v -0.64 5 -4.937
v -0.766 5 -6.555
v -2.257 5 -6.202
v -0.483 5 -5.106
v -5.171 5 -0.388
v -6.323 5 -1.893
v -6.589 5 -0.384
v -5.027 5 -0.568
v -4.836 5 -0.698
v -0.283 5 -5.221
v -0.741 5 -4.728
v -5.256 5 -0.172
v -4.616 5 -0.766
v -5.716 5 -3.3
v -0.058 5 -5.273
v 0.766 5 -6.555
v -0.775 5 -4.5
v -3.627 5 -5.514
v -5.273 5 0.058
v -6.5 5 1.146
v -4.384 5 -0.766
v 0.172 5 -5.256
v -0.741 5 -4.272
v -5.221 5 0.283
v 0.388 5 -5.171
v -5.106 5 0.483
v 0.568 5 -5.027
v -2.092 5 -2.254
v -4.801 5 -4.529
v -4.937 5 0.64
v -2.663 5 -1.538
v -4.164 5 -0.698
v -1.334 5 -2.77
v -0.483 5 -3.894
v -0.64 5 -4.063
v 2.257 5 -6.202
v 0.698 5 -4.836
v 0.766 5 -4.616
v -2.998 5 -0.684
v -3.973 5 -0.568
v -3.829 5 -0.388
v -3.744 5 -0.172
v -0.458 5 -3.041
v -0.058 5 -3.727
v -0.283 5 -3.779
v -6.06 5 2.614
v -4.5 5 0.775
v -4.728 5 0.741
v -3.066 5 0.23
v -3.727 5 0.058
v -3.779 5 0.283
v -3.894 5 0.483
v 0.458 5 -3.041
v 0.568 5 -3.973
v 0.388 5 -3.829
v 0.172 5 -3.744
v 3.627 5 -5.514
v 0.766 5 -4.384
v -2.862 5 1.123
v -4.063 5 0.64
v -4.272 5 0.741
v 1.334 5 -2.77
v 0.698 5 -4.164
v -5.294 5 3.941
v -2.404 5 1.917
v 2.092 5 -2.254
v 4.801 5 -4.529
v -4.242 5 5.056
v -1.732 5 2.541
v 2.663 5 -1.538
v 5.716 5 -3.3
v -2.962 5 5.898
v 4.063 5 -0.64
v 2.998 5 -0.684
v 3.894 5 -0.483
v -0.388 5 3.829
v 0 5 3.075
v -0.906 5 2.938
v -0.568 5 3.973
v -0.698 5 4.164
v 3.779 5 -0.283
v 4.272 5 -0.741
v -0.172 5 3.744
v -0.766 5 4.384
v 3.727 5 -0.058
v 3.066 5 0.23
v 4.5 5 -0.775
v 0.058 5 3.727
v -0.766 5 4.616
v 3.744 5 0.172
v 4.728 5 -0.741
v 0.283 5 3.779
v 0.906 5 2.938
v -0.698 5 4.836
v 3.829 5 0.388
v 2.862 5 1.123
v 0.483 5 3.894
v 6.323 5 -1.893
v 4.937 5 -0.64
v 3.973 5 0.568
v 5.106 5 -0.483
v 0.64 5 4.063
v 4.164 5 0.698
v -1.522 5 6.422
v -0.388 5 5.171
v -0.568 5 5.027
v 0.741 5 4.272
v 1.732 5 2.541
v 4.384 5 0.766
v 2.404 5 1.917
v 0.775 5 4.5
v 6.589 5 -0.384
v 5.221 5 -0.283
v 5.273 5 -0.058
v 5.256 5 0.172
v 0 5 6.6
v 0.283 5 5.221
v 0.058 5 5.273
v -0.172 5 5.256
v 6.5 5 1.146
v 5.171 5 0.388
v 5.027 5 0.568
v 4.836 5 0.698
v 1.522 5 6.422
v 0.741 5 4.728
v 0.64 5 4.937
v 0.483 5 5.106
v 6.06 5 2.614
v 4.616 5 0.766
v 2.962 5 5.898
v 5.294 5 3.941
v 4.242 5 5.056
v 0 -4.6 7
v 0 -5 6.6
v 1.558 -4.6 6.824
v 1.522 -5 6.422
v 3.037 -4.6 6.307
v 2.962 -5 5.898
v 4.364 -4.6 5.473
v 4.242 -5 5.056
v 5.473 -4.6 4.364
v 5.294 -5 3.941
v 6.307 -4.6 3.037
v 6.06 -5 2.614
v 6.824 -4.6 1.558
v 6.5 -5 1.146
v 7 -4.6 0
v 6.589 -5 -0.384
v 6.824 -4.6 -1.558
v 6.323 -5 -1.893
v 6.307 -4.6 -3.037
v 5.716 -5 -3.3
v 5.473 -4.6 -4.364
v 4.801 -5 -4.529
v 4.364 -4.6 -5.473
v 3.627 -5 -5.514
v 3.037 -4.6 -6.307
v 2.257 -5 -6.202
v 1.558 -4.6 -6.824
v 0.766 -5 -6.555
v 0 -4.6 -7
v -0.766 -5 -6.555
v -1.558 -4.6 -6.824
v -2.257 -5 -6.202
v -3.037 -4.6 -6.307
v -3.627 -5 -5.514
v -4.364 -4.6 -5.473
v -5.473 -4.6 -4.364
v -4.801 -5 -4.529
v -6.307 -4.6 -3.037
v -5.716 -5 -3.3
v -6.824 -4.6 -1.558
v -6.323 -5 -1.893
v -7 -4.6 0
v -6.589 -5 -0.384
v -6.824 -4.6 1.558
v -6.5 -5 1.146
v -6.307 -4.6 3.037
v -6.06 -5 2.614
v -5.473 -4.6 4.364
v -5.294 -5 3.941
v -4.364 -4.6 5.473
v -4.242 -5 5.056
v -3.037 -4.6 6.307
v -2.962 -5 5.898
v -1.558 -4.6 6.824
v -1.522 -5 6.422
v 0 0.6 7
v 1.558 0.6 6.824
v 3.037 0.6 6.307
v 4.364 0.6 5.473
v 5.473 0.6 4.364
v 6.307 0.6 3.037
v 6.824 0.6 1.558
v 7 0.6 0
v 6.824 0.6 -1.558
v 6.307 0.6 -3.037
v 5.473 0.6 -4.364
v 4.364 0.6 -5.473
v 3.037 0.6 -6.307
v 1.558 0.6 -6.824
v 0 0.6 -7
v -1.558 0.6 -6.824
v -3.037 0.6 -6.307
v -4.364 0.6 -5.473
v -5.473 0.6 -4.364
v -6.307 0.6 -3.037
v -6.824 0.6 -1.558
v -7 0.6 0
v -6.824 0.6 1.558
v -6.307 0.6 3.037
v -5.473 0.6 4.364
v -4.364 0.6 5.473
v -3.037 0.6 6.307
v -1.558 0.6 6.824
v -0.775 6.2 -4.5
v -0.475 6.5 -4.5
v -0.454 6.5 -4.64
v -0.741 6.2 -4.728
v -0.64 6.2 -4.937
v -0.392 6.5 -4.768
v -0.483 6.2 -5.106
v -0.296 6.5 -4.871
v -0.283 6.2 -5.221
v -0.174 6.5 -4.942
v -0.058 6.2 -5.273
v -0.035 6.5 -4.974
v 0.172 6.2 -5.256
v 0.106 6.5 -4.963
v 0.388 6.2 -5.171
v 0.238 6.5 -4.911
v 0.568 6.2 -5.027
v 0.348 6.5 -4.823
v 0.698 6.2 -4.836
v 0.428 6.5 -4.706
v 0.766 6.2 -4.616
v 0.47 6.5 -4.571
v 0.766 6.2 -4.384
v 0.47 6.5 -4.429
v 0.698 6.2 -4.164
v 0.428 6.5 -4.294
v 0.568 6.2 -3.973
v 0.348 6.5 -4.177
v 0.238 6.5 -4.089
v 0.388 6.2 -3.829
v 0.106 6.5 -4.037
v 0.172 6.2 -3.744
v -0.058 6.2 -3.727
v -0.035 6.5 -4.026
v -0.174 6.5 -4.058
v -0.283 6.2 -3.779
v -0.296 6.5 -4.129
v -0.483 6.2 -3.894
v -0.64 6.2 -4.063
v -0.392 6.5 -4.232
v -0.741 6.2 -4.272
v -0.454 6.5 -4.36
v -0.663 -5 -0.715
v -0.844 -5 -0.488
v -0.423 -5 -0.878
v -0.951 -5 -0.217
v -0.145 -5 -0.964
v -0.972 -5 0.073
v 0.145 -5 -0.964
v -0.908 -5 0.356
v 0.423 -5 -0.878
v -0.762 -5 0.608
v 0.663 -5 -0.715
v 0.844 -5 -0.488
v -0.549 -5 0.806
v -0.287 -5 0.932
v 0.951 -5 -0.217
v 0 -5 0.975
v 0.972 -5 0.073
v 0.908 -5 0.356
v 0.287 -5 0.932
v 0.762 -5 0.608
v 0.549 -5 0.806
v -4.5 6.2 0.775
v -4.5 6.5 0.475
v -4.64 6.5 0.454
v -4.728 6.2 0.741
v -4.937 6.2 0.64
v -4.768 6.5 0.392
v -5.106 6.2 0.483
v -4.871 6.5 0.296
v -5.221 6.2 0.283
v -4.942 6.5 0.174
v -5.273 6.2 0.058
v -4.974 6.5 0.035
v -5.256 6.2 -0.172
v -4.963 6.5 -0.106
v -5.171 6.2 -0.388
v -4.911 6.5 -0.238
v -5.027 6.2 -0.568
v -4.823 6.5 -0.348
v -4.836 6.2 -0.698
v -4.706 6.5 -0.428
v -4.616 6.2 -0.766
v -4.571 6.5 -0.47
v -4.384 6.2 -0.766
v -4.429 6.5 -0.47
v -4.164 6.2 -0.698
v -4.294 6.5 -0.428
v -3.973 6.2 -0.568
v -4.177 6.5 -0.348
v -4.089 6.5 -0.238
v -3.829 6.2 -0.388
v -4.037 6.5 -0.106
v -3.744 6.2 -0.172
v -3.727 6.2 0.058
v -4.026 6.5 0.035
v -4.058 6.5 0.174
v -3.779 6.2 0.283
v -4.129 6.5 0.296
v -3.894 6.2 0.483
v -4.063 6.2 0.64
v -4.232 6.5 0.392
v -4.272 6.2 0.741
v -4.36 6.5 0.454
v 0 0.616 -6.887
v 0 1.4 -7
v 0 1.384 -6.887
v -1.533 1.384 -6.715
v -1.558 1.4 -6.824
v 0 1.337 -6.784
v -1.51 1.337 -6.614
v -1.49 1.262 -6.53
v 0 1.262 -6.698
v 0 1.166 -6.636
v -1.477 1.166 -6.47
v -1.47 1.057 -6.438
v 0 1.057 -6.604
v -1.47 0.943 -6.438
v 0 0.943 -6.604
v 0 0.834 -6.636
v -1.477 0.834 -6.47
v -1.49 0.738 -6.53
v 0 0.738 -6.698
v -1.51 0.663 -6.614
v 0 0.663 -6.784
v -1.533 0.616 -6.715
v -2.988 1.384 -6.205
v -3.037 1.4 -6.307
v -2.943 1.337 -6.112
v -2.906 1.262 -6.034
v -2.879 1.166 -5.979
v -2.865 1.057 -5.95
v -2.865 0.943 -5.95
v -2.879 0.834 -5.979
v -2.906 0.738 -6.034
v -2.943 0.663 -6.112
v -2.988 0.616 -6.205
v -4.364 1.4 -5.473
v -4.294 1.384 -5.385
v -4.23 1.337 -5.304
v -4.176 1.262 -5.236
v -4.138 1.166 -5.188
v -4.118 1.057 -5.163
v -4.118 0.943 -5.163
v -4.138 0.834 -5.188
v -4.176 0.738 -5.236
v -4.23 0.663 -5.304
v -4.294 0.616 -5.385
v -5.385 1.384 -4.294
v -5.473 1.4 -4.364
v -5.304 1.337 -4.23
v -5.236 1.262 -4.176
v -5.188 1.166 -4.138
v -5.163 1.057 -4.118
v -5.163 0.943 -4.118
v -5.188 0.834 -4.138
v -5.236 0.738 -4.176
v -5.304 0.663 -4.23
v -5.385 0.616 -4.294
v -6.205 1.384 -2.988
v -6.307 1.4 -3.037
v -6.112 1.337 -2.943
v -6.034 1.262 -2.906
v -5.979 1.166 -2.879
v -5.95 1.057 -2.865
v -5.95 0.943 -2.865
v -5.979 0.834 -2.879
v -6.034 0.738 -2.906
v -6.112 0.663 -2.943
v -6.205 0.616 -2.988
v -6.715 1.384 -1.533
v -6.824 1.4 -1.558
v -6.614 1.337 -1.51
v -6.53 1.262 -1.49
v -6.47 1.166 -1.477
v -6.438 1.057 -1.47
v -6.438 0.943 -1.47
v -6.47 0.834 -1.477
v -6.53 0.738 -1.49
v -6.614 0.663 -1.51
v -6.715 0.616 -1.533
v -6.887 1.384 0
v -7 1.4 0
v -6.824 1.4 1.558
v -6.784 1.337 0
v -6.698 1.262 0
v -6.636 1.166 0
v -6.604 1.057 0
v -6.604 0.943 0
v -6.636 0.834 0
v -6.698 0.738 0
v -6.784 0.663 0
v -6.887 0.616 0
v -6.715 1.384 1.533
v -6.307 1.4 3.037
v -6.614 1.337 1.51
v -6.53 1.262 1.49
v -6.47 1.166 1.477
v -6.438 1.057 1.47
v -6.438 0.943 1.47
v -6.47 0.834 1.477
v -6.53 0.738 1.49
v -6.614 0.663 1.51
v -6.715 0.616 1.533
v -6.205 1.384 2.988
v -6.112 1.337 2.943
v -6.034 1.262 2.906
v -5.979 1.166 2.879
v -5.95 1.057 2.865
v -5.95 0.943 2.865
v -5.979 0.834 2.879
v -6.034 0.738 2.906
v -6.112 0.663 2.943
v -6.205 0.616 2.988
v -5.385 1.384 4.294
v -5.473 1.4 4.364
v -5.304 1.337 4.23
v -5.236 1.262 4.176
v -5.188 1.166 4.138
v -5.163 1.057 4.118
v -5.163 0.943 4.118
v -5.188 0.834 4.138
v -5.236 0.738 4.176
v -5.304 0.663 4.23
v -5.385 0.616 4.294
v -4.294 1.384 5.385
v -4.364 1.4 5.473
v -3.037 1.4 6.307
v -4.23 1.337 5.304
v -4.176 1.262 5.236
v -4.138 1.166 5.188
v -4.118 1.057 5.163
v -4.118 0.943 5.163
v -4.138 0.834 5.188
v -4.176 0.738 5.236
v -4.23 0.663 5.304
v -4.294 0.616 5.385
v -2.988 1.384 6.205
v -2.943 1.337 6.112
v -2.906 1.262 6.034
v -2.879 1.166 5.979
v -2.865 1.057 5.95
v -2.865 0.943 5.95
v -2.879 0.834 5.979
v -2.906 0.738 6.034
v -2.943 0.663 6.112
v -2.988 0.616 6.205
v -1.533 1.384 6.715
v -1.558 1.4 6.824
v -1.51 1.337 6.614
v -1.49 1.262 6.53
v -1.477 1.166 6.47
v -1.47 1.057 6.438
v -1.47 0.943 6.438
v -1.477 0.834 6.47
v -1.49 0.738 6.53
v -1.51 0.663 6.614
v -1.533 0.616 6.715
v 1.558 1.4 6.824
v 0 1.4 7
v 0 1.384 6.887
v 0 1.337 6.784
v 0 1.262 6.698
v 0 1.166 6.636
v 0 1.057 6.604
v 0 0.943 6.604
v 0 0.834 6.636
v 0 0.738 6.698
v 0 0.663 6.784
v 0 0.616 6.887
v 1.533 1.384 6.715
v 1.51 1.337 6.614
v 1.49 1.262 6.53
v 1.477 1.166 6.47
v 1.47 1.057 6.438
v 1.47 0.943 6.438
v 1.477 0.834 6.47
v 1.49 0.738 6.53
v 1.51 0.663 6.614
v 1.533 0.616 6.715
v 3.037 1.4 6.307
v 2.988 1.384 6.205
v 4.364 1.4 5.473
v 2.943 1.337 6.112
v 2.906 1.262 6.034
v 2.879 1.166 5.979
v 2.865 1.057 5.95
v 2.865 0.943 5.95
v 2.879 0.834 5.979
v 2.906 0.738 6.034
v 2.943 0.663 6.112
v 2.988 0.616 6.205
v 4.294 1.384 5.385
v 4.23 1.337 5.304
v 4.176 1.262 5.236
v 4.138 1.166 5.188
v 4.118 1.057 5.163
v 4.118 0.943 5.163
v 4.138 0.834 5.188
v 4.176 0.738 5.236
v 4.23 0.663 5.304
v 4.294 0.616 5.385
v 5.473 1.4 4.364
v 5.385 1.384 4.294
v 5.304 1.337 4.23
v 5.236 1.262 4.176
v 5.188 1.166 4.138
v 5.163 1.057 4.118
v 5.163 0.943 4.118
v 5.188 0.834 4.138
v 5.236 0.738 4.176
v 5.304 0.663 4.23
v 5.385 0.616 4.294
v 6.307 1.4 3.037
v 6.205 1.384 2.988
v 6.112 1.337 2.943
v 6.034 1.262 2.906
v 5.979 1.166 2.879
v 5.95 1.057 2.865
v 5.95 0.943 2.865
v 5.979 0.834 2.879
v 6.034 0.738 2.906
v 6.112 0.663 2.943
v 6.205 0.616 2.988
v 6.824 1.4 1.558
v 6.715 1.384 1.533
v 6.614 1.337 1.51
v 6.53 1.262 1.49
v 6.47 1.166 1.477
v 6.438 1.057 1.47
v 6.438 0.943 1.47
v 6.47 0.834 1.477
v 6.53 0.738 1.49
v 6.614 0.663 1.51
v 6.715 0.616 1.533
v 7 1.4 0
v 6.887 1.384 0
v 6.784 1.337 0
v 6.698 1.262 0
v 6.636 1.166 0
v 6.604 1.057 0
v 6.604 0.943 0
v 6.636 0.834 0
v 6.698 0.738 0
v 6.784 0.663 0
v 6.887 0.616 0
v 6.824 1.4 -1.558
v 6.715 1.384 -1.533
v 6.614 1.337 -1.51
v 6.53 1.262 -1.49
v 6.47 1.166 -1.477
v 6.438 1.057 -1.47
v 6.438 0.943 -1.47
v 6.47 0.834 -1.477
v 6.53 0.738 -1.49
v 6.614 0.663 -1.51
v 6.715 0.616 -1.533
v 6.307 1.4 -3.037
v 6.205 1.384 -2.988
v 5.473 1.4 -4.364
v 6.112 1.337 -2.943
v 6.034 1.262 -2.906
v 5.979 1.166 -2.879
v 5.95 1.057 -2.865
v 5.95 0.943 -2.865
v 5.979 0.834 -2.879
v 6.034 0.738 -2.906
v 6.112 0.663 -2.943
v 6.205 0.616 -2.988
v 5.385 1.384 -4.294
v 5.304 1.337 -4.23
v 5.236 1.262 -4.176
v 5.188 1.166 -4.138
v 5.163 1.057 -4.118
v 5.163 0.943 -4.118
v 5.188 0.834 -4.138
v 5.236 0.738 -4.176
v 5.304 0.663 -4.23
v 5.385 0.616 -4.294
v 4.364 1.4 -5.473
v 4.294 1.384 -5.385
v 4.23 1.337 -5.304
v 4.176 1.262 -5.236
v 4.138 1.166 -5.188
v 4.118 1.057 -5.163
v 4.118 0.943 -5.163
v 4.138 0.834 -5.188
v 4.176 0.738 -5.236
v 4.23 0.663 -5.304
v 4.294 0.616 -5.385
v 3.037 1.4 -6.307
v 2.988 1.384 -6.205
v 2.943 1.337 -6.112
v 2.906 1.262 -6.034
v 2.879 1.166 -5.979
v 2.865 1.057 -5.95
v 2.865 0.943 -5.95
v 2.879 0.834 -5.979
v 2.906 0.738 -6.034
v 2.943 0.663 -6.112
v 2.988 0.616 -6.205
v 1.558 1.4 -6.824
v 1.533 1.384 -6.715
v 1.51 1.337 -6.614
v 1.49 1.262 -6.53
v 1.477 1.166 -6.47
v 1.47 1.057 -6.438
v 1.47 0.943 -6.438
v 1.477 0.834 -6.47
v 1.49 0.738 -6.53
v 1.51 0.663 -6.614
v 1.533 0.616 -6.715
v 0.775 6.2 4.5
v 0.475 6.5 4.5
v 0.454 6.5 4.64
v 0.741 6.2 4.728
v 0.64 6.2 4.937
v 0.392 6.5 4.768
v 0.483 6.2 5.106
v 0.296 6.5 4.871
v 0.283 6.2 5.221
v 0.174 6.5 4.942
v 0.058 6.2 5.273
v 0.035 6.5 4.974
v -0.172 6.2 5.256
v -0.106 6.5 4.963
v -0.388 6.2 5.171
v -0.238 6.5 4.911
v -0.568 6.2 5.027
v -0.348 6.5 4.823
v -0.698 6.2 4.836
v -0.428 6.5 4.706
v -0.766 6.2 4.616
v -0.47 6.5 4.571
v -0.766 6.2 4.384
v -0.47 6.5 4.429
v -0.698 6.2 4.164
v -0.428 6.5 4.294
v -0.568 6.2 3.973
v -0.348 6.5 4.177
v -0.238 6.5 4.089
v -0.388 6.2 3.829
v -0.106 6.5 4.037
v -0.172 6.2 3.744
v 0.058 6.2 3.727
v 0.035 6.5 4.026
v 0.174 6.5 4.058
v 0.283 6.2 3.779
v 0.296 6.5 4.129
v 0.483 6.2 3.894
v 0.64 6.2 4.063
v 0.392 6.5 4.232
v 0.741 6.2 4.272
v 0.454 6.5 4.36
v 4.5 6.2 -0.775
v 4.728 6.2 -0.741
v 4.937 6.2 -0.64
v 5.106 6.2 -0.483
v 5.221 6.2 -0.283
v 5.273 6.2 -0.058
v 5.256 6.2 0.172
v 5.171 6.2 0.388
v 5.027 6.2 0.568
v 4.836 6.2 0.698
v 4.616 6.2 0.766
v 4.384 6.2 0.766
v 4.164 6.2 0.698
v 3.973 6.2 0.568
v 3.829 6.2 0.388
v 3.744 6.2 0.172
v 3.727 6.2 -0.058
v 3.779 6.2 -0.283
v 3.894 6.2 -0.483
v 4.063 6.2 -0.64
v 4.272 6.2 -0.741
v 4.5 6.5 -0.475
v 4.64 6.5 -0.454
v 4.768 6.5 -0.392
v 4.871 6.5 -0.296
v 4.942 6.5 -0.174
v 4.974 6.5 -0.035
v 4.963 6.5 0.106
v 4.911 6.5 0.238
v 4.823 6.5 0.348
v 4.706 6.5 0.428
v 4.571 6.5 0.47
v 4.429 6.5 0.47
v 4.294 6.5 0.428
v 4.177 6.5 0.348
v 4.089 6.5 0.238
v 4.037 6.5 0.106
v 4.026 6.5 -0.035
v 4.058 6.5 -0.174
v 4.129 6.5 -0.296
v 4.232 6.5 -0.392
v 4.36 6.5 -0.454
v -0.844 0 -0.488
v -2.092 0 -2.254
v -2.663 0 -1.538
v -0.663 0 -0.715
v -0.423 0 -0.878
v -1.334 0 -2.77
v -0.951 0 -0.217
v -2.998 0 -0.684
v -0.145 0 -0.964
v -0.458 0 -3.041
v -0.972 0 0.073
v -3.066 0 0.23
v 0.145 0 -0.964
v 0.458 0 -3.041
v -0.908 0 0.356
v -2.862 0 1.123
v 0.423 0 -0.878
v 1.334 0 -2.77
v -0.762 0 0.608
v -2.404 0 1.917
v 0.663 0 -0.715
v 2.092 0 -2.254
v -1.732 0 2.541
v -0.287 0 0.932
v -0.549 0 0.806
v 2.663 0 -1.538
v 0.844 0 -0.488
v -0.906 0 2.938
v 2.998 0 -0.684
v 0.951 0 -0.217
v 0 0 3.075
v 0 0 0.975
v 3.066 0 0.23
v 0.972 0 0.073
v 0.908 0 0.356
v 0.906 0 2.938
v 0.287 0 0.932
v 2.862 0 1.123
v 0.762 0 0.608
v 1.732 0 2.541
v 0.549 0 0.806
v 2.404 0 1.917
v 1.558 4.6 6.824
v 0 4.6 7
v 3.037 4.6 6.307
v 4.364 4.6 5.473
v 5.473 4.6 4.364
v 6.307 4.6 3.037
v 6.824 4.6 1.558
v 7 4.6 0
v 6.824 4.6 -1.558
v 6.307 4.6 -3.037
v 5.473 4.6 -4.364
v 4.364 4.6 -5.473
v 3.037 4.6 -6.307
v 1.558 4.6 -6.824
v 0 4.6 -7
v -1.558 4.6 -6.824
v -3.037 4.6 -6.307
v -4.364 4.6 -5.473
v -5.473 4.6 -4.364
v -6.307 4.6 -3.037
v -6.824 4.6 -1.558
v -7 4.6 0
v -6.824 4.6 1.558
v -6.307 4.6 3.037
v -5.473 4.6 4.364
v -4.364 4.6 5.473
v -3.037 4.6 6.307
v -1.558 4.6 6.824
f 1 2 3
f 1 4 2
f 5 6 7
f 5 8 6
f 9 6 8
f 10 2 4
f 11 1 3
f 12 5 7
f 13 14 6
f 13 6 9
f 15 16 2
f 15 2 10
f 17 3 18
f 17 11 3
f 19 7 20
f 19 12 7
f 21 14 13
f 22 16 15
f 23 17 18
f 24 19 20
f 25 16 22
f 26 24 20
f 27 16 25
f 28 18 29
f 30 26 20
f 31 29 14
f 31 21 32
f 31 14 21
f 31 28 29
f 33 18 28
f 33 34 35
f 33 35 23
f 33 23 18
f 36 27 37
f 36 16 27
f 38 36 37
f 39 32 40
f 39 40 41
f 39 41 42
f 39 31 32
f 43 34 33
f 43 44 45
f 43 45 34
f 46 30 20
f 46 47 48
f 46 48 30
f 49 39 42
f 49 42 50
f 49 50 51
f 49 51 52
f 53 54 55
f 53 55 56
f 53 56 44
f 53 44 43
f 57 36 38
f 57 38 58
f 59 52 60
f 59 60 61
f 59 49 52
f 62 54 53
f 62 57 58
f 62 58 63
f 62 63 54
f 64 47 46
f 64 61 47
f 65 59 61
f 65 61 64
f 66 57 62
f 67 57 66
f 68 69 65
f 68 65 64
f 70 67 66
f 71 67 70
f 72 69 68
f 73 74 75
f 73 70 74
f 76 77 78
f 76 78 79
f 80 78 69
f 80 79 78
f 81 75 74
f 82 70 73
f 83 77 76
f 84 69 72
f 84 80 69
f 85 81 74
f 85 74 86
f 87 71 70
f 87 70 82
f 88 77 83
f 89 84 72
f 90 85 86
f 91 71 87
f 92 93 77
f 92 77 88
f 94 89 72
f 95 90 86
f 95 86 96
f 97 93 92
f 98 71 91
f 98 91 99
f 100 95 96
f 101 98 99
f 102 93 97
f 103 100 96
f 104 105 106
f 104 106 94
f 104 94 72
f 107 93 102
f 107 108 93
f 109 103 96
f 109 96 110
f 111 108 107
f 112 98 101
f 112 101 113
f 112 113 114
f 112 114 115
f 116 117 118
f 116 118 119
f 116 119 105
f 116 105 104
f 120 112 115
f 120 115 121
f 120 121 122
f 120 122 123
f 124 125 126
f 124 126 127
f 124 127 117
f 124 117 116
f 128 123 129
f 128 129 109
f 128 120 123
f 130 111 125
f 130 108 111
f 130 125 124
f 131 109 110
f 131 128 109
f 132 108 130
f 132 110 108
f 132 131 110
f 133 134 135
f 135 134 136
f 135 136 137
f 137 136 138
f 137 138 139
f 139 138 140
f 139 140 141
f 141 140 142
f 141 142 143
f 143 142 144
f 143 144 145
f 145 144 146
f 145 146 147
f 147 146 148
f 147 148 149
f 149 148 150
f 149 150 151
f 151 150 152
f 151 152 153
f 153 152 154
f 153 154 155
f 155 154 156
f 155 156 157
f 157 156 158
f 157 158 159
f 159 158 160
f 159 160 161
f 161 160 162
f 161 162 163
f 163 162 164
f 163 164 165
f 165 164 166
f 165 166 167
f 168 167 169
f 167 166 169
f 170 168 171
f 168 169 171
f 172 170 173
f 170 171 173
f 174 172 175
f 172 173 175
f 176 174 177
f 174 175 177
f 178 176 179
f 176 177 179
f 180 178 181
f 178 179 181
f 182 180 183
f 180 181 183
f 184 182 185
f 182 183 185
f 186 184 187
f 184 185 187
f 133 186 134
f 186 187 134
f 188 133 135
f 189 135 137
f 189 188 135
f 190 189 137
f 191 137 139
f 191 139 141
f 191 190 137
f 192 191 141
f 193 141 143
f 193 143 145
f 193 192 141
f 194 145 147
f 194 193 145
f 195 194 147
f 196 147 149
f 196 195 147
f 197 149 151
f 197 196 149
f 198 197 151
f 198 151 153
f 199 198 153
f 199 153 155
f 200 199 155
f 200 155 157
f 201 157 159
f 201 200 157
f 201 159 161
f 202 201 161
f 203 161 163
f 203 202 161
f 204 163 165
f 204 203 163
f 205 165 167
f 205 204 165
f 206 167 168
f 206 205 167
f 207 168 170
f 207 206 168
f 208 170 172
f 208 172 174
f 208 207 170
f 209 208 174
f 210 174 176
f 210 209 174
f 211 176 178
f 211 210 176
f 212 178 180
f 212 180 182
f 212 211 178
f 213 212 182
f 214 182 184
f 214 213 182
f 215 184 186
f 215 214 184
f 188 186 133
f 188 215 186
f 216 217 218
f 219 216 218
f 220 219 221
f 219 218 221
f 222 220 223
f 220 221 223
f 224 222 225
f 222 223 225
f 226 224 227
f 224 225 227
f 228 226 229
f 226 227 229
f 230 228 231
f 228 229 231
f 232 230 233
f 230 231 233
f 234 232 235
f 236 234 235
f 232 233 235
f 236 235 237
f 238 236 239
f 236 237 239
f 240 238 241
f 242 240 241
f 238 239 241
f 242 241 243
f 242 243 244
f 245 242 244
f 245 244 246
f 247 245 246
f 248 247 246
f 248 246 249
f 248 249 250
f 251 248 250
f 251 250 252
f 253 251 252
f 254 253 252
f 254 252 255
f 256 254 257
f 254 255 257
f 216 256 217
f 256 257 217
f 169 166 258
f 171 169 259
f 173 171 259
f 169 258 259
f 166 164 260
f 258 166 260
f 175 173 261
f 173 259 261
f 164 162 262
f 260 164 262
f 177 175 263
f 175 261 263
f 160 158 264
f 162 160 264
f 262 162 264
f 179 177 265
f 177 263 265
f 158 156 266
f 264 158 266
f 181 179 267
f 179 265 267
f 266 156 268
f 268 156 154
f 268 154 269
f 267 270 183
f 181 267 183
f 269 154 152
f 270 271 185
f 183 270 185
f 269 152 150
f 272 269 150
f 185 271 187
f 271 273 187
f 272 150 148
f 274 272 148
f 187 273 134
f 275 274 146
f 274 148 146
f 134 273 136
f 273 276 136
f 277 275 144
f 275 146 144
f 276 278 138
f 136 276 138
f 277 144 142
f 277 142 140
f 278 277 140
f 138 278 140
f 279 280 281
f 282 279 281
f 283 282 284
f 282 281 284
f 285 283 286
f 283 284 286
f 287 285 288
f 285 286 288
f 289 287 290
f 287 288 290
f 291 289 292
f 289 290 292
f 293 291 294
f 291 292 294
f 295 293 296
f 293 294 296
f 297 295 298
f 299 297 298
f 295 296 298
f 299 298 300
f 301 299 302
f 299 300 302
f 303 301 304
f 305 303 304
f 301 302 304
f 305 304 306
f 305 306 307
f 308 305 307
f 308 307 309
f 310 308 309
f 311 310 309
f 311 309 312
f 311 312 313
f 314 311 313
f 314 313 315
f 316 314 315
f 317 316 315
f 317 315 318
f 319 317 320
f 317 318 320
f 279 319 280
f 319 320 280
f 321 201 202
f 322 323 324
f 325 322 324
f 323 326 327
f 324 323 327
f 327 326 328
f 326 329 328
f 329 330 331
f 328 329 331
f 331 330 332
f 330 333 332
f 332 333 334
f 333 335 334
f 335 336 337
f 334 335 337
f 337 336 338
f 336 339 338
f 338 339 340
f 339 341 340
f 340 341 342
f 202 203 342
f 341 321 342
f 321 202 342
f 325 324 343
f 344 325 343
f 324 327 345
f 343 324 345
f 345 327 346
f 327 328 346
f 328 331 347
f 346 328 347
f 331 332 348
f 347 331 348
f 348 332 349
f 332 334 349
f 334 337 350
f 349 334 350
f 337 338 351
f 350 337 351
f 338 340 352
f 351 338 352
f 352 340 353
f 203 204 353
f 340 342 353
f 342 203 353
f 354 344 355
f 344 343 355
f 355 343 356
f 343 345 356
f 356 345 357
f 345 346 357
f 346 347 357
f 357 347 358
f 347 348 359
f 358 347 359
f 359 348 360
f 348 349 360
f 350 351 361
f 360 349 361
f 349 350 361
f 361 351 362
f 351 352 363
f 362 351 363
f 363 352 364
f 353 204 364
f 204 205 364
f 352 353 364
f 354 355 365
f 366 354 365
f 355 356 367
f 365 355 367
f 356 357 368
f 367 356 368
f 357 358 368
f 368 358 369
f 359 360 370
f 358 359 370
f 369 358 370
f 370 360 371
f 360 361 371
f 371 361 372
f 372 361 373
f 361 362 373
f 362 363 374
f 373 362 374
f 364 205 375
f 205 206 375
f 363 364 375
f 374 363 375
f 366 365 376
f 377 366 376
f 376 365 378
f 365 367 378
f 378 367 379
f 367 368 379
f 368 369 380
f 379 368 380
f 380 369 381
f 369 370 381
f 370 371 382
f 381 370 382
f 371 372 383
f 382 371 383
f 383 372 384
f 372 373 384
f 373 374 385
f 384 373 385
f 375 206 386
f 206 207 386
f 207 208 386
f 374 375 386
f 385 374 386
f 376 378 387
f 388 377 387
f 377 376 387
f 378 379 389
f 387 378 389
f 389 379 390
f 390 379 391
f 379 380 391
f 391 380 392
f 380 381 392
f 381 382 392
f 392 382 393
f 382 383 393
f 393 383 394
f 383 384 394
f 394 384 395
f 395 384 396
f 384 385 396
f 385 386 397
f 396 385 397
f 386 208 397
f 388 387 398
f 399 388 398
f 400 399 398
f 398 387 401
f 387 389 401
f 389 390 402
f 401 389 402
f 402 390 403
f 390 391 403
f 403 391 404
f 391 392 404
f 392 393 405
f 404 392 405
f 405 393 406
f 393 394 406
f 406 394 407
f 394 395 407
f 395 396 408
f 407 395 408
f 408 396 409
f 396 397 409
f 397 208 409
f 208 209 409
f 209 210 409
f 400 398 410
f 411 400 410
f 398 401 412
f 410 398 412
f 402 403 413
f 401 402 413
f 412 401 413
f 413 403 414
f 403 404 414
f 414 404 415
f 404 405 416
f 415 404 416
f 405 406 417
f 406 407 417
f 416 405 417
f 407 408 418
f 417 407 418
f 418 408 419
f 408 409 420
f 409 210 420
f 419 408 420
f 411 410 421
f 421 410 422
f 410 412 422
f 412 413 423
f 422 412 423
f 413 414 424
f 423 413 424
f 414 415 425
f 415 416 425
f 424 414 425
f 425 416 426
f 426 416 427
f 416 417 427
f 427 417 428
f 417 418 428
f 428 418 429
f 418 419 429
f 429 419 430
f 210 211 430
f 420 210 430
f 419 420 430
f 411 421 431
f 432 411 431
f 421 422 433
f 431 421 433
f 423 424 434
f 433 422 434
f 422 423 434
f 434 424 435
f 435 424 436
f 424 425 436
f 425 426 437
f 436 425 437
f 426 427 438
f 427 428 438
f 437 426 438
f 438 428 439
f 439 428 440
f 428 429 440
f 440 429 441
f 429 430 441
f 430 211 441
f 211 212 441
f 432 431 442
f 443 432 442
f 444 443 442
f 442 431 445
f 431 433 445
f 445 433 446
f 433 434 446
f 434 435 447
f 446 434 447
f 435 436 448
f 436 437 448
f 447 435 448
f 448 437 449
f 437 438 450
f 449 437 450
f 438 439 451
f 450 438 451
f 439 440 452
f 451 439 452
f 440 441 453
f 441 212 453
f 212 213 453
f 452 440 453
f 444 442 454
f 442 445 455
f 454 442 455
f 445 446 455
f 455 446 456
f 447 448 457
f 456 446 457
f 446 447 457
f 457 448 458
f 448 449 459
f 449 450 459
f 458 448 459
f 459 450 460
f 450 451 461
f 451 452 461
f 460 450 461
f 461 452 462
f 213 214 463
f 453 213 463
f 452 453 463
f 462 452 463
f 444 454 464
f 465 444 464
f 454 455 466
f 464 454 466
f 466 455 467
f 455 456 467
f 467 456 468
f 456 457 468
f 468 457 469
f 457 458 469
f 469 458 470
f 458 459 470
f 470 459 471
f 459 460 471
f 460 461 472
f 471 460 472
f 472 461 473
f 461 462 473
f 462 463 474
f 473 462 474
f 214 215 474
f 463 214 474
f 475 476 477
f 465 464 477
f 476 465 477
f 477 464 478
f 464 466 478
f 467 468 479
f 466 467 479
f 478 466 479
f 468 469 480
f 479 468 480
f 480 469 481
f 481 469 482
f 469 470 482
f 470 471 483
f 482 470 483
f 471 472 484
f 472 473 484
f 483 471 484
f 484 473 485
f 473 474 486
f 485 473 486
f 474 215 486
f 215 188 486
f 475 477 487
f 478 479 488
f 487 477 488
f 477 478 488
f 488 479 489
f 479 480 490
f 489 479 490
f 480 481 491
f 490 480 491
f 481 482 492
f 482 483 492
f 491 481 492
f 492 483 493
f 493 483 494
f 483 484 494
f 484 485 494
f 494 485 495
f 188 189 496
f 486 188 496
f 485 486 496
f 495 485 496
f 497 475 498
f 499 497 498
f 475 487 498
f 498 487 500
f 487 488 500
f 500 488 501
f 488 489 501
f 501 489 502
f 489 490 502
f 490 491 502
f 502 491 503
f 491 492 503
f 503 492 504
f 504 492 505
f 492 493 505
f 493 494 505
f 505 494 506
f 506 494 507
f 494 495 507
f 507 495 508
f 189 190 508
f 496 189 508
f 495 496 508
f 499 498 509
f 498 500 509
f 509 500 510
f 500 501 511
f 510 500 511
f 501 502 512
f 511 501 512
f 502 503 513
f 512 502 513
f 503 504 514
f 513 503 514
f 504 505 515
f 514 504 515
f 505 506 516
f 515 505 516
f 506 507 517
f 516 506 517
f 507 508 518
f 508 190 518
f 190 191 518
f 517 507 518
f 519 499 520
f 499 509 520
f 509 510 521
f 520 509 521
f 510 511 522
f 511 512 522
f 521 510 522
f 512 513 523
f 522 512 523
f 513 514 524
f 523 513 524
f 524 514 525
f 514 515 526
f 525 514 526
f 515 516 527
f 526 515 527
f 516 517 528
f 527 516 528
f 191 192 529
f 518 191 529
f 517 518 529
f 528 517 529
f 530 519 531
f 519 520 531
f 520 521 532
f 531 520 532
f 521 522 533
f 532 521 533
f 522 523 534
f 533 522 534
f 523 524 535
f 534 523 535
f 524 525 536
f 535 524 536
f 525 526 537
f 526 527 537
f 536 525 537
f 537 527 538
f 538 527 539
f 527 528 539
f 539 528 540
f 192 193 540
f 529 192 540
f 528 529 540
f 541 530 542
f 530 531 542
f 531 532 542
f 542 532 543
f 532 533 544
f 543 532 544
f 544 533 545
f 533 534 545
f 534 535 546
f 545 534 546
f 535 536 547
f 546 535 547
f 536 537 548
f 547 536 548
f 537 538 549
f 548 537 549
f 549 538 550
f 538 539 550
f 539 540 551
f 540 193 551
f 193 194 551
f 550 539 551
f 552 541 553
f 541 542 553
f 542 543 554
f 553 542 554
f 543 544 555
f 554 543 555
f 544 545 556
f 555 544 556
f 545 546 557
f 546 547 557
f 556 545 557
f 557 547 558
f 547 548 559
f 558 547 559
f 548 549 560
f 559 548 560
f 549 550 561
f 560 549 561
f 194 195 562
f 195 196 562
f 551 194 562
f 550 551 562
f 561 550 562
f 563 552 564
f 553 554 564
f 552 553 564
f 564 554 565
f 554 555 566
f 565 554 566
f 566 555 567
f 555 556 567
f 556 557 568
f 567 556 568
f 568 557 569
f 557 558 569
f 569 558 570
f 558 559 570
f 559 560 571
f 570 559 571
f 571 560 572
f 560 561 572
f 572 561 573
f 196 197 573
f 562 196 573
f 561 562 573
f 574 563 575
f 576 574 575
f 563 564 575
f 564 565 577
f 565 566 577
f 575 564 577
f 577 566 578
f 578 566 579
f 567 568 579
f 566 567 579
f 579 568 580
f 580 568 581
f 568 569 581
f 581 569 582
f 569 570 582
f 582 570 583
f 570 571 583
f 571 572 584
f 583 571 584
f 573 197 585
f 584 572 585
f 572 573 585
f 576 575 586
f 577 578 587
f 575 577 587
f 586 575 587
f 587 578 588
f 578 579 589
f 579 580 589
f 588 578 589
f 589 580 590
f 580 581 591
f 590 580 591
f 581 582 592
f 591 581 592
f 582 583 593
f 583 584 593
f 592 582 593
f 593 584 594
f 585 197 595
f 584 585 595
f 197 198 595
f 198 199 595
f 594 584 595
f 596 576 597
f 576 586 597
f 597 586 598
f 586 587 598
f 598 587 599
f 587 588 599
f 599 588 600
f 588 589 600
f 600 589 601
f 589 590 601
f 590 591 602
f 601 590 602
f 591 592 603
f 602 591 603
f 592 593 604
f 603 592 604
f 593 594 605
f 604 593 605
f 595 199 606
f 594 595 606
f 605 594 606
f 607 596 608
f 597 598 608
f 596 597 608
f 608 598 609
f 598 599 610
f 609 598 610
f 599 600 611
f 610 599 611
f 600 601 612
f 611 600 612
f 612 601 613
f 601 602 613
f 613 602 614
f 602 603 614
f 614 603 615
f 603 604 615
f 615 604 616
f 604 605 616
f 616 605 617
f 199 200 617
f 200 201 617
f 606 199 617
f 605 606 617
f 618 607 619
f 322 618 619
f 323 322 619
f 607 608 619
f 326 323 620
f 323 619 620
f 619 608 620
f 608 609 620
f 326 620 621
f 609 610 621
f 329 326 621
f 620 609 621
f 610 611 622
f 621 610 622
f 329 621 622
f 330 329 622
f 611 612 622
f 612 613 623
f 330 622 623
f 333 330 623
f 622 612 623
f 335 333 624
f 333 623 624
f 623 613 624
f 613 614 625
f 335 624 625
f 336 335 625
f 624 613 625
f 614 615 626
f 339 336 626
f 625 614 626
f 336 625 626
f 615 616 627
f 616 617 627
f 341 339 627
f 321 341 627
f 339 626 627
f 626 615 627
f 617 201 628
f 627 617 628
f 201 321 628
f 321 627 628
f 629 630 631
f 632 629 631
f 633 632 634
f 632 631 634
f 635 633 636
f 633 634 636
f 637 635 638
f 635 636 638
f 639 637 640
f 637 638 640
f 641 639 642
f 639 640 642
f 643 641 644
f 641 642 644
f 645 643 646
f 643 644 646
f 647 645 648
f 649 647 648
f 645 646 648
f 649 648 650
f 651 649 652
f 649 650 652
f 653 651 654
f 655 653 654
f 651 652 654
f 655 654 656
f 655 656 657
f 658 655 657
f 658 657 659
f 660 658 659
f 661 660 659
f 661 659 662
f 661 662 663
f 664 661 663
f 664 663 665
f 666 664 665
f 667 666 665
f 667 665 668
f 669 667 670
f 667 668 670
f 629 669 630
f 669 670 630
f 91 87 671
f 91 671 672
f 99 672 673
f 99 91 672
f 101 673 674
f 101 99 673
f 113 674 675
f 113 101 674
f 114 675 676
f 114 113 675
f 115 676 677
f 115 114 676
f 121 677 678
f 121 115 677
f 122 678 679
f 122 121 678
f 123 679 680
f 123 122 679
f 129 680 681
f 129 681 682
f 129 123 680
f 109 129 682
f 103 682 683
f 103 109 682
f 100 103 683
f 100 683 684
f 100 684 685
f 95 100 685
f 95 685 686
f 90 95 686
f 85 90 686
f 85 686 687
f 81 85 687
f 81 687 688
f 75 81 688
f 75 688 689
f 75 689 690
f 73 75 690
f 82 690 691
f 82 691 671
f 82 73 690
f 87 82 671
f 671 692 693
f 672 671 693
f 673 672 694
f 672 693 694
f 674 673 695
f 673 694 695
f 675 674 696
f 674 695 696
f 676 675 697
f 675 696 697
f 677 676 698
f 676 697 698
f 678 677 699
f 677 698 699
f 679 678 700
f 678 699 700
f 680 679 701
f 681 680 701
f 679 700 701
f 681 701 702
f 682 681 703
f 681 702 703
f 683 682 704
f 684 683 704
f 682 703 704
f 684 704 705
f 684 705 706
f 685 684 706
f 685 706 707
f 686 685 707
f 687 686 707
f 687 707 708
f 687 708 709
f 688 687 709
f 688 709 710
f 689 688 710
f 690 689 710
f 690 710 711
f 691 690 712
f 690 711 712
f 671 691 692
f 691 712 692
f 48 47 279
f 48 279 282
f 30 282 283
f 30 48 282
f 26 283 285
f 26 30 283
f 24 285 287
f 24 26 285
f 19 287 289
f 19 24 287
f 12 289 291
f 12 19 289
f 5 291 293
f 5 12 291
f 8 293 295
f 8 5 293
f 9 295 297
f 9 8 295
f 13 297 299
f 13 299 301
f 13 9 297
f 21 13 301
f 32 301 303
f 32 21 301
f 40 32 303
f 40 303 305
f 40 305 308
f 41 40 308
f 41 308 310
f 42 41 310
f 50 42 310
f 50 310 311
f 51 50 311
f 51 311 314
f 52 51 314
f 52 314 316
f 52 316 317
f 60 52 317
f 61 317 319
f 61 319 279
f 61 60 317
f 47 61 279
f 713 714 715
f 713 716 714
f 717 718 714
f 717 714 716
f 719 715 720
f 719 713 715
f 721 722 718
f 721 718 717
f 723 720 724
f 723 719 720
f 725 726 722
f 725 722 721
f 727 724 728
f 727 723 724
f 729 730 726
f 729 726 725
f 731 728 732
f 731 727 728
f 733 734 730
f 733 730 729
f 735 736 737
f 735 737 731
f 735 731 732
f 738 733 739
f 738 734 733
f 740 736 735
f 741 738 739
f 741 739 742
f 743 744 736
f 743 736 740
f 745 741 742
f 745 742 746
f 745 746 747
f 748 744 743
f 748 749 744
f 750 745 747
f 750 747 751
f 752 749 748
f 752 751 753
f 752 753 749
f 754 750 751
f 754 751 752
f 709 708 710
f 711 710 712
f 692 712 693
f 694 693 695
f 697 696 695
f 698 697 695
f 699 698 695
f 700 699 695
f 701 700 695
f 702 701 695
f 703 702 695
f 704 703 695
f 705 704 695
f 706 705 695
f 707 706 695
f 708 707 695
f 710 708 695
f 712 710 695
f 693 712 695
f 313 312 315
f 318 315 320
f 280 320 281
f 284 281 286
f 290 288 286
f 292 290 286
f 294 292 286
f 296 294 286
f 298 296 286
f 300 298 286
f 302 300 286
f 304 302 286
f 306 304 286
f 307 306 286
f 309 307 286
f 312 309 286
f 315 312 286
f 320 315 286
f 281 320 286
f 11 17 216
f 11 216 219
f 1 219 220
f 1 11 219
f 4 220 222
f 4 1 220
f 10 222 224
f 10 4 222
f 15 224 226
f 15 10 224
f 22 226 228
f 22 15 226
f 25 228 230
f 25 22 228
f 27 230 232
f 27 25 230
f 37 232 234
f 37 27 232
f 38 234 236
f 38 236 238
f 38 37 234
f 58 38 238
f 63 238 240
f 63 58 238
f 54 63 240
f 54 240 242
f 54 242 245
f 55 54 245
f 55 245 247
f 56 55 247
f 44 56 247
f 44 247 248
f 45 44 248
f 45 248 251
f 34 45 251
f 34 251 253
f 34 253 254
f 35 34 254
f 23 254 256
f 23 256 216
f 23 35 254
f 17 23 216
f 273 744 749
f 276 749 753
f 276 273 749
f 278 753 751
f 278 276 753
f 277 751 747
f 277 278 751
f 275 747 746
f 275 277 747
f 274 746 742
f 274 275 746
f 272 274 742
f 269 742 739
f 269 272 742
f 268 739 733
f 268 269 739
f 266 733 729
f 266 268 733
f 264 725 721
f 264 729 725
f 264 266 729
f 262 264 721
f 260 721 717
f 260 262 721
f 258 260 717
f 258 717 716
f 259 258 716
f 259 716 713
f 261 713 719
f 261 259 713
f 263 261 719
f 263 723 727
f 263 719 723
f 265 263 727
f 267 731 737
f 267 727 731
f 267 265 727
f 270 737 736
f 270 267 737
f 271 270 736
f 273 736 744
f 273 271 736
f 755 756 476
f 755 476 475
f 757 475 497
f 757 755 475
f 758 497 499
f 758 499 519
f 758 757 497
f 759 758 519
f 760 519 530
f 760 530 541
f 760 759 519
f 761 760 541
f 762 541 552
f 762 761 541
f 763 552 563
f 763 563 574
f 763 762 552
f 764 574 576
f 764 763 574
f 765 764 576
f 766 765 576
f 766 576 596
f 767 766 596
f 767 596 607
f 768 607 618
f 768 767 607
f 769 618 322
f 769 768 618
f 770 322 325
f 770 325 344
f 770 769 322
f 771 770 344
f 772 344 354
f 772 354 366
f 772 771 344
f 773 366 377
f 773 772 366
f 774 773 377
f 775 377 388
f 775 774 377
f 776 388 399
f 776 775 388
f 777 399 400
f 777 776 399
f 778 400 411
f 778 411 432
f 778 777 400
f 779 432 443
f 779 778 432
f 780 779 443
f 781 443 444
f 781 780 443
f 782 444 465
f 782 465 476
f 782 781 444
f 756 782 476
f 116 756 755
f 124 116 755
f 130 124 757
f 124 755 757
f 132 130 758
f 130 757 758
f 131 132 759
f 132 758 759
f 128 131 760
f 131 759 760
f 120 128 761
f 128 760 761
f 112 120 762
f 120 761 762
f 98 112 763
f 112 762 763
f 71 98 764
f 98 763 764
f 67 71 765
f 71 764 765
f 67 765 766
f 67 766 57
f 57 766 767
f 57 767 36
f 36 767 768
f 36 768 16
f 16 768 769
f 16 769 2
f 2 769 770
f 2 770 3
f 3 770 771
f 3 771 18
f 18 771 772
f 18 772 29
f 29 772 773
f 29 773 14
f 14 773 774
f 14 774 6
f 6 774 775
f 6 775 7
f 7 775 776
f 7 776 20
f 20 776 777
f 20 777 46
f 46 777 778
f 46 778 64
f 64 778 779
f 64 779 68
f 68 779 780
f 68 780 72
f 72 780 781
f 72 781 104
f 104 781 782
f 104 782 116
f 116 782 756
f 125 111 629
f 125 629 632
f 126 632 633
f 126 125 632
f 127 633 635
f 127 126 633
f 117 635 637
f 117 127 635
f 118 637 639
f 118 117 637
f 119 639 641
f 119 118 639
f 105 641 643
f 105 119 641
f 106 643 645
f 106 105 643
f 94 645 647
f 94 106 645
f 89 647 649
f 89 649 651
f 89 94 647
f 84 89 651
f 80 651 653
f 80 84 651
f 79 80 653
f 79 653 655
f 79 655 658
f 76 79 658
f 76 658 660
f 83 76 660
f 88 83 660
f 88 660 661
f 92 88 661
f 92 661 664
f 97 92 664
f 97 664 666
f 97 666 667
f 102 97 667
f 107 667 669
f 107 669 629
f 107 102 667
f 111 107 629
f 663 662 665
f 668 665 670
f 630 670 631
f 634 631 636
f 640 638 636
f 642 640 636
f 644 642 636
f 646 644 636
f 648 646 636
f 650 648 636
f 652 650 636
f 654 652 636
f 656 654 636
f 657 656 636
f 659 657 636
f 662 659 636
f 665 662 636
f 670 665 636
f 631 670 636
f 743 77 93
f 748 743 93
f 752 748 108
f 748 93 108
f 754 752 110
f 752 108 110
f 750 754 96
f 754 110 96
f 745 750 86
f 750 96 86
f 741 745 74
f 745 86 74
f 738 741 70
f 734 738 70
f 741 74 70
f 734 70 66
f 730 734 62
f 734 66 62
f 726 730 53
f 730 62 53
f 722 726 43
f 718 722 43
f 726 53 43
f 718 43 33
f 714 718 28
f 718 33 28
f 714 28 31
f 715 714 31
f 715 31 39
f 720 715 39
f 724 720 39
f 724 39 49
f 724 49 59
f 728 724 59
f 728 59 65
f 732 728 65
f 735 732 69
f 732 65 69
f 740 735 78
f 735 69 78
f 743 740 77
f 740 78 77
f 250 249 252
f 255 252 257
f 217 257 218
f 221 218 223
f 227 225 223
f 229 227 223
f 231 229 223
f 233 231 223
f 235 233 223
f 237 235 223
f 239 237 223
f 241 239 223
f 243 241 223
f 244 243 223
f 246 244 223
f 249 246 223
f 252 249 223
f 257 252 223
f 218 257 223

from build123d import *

# Parameters (mm, degrees)
SKETCH1_R                    = 7
SKETCH1_R_2                  = 0.975
BOSS_EXTRUDE1_DEPTH          = 5
SKETCH3_R                    = 3.075
CUT_EXTRUDE1_DEPTH           = 5
SKETCH4_R                    = 0.775
BOSS_EXTRUDE3_DEPTH          = 1.5
CHAMFER1_SIZE                = 0.3
CIRPATTERN1_COUNT            = 4
CHAMFER1_OF_CIRPATTERN1_SIZE = 0.3
SKETCH8_R                    = 0.4
CHAMFER2_SIZE                = 0.4


with BuildPart() as part:
    # Sketch1 → Boss-Extrude1 (new, symmetric)
    with BuildSketch(Plane(origin=(0, 0, 0), x_dir=(1, 0, 0), z_dir=(0, 1, 0))):
        with Locations(Location((0, 0, 0), (0, 0, 270))):
            Circle(SKETCH1_R)
        with Locations(Location((0, 0, 0), (0, 0, 270))):
            Circle(SKETCH1_R_2, mode=Mode.SUBTRACT)
    extrude(amount=BOSS_EXTRUDE1_DEPTH, both=True)

    # Sketch3 → Cut-Extrude1 (cut)
    with BuildSketch(Plane(origin=(0, 5, 0), x_dir=(1, 0, 0), z_dir=(0, 1, 0))):
        with Locations(Location((0, 0, 0), (0, 0, 270))):
            Circle(SKETCH3_R)
    extrude(amount=-CUT_EXTRUDE1_DEPTH, mode=Mode.SUBTRACT)

    # Sketch4 → Boss-Extrude3 (add)
    with BuildSketch(Plane.XZ.offset(-5)):
        with Locations(Location((4.5, 0, 0), (0, 0, 270))):
            Circle(SKETCH4_R)
    boss_extrude3 = extrude(amount=-BOSS_EXTRUDE3_DEPTH)

    # Chamfer1
    chamfer1_edges = [part.edges().sort_by_distance(p)[0] for p in [
        (4.5, 6.5, 0.775),
    ]]
    chamfer(chamfer1_edges, length=CHAMFER1_SIZE)

    # CirPattern1: Boss-Extrude3 ×4 about axis
    cirpattern1_axis = Axis((0, 0, 0), (0, 1, 0))
    for i in range(1, CIRPATTERN1_COUNT):
        add(boss_extrude3.rotate(cirpattern1_axis, i * 360 / CIRPATTERN1_COUNT))

    # Chamfer1 of CirPattern1
    chamfer1_of_cirpattern1_edges = [part.edges().sort_by_distance(p)[0] for p in [
        (0.775, 6.5, -4.5),
        (-4.5, 6.5, -0.775),
        (-0.775, 6.5, 4.5),
    ]]
    chamfer(chamfer1_of_cirpattern1_edges, length=CHAMFER1_OF_CIRPATTERN1_SIZE)

    # Sketch8 → Cut-Revolve1 (revolve, cut)
    with BuildSketch(Plane.XY, mode=Mode.PRIVATE) as cut_revolve1_sk:
        with Locations((7, 1)):
            Circle(SKETCH8_R)
    revolve(cut_revolve1_sk.sketch.rotate(Axis((0, 0, 0), (0, 1, 0)), 90), axis=Axis((0, 0, 0), (0, 1, 0)), mode=Mode.SUBTRACT)

    # Chamfer2
    chamfer2_edges = [part.edges().sort_by_distance(p)[0] for p in [
        (0, -5, -7),
        (0, 5, -7),
    ]]
    chamfer(chamfer2_edges, length=CHAMFER2_SIZE)


solid = part.part
